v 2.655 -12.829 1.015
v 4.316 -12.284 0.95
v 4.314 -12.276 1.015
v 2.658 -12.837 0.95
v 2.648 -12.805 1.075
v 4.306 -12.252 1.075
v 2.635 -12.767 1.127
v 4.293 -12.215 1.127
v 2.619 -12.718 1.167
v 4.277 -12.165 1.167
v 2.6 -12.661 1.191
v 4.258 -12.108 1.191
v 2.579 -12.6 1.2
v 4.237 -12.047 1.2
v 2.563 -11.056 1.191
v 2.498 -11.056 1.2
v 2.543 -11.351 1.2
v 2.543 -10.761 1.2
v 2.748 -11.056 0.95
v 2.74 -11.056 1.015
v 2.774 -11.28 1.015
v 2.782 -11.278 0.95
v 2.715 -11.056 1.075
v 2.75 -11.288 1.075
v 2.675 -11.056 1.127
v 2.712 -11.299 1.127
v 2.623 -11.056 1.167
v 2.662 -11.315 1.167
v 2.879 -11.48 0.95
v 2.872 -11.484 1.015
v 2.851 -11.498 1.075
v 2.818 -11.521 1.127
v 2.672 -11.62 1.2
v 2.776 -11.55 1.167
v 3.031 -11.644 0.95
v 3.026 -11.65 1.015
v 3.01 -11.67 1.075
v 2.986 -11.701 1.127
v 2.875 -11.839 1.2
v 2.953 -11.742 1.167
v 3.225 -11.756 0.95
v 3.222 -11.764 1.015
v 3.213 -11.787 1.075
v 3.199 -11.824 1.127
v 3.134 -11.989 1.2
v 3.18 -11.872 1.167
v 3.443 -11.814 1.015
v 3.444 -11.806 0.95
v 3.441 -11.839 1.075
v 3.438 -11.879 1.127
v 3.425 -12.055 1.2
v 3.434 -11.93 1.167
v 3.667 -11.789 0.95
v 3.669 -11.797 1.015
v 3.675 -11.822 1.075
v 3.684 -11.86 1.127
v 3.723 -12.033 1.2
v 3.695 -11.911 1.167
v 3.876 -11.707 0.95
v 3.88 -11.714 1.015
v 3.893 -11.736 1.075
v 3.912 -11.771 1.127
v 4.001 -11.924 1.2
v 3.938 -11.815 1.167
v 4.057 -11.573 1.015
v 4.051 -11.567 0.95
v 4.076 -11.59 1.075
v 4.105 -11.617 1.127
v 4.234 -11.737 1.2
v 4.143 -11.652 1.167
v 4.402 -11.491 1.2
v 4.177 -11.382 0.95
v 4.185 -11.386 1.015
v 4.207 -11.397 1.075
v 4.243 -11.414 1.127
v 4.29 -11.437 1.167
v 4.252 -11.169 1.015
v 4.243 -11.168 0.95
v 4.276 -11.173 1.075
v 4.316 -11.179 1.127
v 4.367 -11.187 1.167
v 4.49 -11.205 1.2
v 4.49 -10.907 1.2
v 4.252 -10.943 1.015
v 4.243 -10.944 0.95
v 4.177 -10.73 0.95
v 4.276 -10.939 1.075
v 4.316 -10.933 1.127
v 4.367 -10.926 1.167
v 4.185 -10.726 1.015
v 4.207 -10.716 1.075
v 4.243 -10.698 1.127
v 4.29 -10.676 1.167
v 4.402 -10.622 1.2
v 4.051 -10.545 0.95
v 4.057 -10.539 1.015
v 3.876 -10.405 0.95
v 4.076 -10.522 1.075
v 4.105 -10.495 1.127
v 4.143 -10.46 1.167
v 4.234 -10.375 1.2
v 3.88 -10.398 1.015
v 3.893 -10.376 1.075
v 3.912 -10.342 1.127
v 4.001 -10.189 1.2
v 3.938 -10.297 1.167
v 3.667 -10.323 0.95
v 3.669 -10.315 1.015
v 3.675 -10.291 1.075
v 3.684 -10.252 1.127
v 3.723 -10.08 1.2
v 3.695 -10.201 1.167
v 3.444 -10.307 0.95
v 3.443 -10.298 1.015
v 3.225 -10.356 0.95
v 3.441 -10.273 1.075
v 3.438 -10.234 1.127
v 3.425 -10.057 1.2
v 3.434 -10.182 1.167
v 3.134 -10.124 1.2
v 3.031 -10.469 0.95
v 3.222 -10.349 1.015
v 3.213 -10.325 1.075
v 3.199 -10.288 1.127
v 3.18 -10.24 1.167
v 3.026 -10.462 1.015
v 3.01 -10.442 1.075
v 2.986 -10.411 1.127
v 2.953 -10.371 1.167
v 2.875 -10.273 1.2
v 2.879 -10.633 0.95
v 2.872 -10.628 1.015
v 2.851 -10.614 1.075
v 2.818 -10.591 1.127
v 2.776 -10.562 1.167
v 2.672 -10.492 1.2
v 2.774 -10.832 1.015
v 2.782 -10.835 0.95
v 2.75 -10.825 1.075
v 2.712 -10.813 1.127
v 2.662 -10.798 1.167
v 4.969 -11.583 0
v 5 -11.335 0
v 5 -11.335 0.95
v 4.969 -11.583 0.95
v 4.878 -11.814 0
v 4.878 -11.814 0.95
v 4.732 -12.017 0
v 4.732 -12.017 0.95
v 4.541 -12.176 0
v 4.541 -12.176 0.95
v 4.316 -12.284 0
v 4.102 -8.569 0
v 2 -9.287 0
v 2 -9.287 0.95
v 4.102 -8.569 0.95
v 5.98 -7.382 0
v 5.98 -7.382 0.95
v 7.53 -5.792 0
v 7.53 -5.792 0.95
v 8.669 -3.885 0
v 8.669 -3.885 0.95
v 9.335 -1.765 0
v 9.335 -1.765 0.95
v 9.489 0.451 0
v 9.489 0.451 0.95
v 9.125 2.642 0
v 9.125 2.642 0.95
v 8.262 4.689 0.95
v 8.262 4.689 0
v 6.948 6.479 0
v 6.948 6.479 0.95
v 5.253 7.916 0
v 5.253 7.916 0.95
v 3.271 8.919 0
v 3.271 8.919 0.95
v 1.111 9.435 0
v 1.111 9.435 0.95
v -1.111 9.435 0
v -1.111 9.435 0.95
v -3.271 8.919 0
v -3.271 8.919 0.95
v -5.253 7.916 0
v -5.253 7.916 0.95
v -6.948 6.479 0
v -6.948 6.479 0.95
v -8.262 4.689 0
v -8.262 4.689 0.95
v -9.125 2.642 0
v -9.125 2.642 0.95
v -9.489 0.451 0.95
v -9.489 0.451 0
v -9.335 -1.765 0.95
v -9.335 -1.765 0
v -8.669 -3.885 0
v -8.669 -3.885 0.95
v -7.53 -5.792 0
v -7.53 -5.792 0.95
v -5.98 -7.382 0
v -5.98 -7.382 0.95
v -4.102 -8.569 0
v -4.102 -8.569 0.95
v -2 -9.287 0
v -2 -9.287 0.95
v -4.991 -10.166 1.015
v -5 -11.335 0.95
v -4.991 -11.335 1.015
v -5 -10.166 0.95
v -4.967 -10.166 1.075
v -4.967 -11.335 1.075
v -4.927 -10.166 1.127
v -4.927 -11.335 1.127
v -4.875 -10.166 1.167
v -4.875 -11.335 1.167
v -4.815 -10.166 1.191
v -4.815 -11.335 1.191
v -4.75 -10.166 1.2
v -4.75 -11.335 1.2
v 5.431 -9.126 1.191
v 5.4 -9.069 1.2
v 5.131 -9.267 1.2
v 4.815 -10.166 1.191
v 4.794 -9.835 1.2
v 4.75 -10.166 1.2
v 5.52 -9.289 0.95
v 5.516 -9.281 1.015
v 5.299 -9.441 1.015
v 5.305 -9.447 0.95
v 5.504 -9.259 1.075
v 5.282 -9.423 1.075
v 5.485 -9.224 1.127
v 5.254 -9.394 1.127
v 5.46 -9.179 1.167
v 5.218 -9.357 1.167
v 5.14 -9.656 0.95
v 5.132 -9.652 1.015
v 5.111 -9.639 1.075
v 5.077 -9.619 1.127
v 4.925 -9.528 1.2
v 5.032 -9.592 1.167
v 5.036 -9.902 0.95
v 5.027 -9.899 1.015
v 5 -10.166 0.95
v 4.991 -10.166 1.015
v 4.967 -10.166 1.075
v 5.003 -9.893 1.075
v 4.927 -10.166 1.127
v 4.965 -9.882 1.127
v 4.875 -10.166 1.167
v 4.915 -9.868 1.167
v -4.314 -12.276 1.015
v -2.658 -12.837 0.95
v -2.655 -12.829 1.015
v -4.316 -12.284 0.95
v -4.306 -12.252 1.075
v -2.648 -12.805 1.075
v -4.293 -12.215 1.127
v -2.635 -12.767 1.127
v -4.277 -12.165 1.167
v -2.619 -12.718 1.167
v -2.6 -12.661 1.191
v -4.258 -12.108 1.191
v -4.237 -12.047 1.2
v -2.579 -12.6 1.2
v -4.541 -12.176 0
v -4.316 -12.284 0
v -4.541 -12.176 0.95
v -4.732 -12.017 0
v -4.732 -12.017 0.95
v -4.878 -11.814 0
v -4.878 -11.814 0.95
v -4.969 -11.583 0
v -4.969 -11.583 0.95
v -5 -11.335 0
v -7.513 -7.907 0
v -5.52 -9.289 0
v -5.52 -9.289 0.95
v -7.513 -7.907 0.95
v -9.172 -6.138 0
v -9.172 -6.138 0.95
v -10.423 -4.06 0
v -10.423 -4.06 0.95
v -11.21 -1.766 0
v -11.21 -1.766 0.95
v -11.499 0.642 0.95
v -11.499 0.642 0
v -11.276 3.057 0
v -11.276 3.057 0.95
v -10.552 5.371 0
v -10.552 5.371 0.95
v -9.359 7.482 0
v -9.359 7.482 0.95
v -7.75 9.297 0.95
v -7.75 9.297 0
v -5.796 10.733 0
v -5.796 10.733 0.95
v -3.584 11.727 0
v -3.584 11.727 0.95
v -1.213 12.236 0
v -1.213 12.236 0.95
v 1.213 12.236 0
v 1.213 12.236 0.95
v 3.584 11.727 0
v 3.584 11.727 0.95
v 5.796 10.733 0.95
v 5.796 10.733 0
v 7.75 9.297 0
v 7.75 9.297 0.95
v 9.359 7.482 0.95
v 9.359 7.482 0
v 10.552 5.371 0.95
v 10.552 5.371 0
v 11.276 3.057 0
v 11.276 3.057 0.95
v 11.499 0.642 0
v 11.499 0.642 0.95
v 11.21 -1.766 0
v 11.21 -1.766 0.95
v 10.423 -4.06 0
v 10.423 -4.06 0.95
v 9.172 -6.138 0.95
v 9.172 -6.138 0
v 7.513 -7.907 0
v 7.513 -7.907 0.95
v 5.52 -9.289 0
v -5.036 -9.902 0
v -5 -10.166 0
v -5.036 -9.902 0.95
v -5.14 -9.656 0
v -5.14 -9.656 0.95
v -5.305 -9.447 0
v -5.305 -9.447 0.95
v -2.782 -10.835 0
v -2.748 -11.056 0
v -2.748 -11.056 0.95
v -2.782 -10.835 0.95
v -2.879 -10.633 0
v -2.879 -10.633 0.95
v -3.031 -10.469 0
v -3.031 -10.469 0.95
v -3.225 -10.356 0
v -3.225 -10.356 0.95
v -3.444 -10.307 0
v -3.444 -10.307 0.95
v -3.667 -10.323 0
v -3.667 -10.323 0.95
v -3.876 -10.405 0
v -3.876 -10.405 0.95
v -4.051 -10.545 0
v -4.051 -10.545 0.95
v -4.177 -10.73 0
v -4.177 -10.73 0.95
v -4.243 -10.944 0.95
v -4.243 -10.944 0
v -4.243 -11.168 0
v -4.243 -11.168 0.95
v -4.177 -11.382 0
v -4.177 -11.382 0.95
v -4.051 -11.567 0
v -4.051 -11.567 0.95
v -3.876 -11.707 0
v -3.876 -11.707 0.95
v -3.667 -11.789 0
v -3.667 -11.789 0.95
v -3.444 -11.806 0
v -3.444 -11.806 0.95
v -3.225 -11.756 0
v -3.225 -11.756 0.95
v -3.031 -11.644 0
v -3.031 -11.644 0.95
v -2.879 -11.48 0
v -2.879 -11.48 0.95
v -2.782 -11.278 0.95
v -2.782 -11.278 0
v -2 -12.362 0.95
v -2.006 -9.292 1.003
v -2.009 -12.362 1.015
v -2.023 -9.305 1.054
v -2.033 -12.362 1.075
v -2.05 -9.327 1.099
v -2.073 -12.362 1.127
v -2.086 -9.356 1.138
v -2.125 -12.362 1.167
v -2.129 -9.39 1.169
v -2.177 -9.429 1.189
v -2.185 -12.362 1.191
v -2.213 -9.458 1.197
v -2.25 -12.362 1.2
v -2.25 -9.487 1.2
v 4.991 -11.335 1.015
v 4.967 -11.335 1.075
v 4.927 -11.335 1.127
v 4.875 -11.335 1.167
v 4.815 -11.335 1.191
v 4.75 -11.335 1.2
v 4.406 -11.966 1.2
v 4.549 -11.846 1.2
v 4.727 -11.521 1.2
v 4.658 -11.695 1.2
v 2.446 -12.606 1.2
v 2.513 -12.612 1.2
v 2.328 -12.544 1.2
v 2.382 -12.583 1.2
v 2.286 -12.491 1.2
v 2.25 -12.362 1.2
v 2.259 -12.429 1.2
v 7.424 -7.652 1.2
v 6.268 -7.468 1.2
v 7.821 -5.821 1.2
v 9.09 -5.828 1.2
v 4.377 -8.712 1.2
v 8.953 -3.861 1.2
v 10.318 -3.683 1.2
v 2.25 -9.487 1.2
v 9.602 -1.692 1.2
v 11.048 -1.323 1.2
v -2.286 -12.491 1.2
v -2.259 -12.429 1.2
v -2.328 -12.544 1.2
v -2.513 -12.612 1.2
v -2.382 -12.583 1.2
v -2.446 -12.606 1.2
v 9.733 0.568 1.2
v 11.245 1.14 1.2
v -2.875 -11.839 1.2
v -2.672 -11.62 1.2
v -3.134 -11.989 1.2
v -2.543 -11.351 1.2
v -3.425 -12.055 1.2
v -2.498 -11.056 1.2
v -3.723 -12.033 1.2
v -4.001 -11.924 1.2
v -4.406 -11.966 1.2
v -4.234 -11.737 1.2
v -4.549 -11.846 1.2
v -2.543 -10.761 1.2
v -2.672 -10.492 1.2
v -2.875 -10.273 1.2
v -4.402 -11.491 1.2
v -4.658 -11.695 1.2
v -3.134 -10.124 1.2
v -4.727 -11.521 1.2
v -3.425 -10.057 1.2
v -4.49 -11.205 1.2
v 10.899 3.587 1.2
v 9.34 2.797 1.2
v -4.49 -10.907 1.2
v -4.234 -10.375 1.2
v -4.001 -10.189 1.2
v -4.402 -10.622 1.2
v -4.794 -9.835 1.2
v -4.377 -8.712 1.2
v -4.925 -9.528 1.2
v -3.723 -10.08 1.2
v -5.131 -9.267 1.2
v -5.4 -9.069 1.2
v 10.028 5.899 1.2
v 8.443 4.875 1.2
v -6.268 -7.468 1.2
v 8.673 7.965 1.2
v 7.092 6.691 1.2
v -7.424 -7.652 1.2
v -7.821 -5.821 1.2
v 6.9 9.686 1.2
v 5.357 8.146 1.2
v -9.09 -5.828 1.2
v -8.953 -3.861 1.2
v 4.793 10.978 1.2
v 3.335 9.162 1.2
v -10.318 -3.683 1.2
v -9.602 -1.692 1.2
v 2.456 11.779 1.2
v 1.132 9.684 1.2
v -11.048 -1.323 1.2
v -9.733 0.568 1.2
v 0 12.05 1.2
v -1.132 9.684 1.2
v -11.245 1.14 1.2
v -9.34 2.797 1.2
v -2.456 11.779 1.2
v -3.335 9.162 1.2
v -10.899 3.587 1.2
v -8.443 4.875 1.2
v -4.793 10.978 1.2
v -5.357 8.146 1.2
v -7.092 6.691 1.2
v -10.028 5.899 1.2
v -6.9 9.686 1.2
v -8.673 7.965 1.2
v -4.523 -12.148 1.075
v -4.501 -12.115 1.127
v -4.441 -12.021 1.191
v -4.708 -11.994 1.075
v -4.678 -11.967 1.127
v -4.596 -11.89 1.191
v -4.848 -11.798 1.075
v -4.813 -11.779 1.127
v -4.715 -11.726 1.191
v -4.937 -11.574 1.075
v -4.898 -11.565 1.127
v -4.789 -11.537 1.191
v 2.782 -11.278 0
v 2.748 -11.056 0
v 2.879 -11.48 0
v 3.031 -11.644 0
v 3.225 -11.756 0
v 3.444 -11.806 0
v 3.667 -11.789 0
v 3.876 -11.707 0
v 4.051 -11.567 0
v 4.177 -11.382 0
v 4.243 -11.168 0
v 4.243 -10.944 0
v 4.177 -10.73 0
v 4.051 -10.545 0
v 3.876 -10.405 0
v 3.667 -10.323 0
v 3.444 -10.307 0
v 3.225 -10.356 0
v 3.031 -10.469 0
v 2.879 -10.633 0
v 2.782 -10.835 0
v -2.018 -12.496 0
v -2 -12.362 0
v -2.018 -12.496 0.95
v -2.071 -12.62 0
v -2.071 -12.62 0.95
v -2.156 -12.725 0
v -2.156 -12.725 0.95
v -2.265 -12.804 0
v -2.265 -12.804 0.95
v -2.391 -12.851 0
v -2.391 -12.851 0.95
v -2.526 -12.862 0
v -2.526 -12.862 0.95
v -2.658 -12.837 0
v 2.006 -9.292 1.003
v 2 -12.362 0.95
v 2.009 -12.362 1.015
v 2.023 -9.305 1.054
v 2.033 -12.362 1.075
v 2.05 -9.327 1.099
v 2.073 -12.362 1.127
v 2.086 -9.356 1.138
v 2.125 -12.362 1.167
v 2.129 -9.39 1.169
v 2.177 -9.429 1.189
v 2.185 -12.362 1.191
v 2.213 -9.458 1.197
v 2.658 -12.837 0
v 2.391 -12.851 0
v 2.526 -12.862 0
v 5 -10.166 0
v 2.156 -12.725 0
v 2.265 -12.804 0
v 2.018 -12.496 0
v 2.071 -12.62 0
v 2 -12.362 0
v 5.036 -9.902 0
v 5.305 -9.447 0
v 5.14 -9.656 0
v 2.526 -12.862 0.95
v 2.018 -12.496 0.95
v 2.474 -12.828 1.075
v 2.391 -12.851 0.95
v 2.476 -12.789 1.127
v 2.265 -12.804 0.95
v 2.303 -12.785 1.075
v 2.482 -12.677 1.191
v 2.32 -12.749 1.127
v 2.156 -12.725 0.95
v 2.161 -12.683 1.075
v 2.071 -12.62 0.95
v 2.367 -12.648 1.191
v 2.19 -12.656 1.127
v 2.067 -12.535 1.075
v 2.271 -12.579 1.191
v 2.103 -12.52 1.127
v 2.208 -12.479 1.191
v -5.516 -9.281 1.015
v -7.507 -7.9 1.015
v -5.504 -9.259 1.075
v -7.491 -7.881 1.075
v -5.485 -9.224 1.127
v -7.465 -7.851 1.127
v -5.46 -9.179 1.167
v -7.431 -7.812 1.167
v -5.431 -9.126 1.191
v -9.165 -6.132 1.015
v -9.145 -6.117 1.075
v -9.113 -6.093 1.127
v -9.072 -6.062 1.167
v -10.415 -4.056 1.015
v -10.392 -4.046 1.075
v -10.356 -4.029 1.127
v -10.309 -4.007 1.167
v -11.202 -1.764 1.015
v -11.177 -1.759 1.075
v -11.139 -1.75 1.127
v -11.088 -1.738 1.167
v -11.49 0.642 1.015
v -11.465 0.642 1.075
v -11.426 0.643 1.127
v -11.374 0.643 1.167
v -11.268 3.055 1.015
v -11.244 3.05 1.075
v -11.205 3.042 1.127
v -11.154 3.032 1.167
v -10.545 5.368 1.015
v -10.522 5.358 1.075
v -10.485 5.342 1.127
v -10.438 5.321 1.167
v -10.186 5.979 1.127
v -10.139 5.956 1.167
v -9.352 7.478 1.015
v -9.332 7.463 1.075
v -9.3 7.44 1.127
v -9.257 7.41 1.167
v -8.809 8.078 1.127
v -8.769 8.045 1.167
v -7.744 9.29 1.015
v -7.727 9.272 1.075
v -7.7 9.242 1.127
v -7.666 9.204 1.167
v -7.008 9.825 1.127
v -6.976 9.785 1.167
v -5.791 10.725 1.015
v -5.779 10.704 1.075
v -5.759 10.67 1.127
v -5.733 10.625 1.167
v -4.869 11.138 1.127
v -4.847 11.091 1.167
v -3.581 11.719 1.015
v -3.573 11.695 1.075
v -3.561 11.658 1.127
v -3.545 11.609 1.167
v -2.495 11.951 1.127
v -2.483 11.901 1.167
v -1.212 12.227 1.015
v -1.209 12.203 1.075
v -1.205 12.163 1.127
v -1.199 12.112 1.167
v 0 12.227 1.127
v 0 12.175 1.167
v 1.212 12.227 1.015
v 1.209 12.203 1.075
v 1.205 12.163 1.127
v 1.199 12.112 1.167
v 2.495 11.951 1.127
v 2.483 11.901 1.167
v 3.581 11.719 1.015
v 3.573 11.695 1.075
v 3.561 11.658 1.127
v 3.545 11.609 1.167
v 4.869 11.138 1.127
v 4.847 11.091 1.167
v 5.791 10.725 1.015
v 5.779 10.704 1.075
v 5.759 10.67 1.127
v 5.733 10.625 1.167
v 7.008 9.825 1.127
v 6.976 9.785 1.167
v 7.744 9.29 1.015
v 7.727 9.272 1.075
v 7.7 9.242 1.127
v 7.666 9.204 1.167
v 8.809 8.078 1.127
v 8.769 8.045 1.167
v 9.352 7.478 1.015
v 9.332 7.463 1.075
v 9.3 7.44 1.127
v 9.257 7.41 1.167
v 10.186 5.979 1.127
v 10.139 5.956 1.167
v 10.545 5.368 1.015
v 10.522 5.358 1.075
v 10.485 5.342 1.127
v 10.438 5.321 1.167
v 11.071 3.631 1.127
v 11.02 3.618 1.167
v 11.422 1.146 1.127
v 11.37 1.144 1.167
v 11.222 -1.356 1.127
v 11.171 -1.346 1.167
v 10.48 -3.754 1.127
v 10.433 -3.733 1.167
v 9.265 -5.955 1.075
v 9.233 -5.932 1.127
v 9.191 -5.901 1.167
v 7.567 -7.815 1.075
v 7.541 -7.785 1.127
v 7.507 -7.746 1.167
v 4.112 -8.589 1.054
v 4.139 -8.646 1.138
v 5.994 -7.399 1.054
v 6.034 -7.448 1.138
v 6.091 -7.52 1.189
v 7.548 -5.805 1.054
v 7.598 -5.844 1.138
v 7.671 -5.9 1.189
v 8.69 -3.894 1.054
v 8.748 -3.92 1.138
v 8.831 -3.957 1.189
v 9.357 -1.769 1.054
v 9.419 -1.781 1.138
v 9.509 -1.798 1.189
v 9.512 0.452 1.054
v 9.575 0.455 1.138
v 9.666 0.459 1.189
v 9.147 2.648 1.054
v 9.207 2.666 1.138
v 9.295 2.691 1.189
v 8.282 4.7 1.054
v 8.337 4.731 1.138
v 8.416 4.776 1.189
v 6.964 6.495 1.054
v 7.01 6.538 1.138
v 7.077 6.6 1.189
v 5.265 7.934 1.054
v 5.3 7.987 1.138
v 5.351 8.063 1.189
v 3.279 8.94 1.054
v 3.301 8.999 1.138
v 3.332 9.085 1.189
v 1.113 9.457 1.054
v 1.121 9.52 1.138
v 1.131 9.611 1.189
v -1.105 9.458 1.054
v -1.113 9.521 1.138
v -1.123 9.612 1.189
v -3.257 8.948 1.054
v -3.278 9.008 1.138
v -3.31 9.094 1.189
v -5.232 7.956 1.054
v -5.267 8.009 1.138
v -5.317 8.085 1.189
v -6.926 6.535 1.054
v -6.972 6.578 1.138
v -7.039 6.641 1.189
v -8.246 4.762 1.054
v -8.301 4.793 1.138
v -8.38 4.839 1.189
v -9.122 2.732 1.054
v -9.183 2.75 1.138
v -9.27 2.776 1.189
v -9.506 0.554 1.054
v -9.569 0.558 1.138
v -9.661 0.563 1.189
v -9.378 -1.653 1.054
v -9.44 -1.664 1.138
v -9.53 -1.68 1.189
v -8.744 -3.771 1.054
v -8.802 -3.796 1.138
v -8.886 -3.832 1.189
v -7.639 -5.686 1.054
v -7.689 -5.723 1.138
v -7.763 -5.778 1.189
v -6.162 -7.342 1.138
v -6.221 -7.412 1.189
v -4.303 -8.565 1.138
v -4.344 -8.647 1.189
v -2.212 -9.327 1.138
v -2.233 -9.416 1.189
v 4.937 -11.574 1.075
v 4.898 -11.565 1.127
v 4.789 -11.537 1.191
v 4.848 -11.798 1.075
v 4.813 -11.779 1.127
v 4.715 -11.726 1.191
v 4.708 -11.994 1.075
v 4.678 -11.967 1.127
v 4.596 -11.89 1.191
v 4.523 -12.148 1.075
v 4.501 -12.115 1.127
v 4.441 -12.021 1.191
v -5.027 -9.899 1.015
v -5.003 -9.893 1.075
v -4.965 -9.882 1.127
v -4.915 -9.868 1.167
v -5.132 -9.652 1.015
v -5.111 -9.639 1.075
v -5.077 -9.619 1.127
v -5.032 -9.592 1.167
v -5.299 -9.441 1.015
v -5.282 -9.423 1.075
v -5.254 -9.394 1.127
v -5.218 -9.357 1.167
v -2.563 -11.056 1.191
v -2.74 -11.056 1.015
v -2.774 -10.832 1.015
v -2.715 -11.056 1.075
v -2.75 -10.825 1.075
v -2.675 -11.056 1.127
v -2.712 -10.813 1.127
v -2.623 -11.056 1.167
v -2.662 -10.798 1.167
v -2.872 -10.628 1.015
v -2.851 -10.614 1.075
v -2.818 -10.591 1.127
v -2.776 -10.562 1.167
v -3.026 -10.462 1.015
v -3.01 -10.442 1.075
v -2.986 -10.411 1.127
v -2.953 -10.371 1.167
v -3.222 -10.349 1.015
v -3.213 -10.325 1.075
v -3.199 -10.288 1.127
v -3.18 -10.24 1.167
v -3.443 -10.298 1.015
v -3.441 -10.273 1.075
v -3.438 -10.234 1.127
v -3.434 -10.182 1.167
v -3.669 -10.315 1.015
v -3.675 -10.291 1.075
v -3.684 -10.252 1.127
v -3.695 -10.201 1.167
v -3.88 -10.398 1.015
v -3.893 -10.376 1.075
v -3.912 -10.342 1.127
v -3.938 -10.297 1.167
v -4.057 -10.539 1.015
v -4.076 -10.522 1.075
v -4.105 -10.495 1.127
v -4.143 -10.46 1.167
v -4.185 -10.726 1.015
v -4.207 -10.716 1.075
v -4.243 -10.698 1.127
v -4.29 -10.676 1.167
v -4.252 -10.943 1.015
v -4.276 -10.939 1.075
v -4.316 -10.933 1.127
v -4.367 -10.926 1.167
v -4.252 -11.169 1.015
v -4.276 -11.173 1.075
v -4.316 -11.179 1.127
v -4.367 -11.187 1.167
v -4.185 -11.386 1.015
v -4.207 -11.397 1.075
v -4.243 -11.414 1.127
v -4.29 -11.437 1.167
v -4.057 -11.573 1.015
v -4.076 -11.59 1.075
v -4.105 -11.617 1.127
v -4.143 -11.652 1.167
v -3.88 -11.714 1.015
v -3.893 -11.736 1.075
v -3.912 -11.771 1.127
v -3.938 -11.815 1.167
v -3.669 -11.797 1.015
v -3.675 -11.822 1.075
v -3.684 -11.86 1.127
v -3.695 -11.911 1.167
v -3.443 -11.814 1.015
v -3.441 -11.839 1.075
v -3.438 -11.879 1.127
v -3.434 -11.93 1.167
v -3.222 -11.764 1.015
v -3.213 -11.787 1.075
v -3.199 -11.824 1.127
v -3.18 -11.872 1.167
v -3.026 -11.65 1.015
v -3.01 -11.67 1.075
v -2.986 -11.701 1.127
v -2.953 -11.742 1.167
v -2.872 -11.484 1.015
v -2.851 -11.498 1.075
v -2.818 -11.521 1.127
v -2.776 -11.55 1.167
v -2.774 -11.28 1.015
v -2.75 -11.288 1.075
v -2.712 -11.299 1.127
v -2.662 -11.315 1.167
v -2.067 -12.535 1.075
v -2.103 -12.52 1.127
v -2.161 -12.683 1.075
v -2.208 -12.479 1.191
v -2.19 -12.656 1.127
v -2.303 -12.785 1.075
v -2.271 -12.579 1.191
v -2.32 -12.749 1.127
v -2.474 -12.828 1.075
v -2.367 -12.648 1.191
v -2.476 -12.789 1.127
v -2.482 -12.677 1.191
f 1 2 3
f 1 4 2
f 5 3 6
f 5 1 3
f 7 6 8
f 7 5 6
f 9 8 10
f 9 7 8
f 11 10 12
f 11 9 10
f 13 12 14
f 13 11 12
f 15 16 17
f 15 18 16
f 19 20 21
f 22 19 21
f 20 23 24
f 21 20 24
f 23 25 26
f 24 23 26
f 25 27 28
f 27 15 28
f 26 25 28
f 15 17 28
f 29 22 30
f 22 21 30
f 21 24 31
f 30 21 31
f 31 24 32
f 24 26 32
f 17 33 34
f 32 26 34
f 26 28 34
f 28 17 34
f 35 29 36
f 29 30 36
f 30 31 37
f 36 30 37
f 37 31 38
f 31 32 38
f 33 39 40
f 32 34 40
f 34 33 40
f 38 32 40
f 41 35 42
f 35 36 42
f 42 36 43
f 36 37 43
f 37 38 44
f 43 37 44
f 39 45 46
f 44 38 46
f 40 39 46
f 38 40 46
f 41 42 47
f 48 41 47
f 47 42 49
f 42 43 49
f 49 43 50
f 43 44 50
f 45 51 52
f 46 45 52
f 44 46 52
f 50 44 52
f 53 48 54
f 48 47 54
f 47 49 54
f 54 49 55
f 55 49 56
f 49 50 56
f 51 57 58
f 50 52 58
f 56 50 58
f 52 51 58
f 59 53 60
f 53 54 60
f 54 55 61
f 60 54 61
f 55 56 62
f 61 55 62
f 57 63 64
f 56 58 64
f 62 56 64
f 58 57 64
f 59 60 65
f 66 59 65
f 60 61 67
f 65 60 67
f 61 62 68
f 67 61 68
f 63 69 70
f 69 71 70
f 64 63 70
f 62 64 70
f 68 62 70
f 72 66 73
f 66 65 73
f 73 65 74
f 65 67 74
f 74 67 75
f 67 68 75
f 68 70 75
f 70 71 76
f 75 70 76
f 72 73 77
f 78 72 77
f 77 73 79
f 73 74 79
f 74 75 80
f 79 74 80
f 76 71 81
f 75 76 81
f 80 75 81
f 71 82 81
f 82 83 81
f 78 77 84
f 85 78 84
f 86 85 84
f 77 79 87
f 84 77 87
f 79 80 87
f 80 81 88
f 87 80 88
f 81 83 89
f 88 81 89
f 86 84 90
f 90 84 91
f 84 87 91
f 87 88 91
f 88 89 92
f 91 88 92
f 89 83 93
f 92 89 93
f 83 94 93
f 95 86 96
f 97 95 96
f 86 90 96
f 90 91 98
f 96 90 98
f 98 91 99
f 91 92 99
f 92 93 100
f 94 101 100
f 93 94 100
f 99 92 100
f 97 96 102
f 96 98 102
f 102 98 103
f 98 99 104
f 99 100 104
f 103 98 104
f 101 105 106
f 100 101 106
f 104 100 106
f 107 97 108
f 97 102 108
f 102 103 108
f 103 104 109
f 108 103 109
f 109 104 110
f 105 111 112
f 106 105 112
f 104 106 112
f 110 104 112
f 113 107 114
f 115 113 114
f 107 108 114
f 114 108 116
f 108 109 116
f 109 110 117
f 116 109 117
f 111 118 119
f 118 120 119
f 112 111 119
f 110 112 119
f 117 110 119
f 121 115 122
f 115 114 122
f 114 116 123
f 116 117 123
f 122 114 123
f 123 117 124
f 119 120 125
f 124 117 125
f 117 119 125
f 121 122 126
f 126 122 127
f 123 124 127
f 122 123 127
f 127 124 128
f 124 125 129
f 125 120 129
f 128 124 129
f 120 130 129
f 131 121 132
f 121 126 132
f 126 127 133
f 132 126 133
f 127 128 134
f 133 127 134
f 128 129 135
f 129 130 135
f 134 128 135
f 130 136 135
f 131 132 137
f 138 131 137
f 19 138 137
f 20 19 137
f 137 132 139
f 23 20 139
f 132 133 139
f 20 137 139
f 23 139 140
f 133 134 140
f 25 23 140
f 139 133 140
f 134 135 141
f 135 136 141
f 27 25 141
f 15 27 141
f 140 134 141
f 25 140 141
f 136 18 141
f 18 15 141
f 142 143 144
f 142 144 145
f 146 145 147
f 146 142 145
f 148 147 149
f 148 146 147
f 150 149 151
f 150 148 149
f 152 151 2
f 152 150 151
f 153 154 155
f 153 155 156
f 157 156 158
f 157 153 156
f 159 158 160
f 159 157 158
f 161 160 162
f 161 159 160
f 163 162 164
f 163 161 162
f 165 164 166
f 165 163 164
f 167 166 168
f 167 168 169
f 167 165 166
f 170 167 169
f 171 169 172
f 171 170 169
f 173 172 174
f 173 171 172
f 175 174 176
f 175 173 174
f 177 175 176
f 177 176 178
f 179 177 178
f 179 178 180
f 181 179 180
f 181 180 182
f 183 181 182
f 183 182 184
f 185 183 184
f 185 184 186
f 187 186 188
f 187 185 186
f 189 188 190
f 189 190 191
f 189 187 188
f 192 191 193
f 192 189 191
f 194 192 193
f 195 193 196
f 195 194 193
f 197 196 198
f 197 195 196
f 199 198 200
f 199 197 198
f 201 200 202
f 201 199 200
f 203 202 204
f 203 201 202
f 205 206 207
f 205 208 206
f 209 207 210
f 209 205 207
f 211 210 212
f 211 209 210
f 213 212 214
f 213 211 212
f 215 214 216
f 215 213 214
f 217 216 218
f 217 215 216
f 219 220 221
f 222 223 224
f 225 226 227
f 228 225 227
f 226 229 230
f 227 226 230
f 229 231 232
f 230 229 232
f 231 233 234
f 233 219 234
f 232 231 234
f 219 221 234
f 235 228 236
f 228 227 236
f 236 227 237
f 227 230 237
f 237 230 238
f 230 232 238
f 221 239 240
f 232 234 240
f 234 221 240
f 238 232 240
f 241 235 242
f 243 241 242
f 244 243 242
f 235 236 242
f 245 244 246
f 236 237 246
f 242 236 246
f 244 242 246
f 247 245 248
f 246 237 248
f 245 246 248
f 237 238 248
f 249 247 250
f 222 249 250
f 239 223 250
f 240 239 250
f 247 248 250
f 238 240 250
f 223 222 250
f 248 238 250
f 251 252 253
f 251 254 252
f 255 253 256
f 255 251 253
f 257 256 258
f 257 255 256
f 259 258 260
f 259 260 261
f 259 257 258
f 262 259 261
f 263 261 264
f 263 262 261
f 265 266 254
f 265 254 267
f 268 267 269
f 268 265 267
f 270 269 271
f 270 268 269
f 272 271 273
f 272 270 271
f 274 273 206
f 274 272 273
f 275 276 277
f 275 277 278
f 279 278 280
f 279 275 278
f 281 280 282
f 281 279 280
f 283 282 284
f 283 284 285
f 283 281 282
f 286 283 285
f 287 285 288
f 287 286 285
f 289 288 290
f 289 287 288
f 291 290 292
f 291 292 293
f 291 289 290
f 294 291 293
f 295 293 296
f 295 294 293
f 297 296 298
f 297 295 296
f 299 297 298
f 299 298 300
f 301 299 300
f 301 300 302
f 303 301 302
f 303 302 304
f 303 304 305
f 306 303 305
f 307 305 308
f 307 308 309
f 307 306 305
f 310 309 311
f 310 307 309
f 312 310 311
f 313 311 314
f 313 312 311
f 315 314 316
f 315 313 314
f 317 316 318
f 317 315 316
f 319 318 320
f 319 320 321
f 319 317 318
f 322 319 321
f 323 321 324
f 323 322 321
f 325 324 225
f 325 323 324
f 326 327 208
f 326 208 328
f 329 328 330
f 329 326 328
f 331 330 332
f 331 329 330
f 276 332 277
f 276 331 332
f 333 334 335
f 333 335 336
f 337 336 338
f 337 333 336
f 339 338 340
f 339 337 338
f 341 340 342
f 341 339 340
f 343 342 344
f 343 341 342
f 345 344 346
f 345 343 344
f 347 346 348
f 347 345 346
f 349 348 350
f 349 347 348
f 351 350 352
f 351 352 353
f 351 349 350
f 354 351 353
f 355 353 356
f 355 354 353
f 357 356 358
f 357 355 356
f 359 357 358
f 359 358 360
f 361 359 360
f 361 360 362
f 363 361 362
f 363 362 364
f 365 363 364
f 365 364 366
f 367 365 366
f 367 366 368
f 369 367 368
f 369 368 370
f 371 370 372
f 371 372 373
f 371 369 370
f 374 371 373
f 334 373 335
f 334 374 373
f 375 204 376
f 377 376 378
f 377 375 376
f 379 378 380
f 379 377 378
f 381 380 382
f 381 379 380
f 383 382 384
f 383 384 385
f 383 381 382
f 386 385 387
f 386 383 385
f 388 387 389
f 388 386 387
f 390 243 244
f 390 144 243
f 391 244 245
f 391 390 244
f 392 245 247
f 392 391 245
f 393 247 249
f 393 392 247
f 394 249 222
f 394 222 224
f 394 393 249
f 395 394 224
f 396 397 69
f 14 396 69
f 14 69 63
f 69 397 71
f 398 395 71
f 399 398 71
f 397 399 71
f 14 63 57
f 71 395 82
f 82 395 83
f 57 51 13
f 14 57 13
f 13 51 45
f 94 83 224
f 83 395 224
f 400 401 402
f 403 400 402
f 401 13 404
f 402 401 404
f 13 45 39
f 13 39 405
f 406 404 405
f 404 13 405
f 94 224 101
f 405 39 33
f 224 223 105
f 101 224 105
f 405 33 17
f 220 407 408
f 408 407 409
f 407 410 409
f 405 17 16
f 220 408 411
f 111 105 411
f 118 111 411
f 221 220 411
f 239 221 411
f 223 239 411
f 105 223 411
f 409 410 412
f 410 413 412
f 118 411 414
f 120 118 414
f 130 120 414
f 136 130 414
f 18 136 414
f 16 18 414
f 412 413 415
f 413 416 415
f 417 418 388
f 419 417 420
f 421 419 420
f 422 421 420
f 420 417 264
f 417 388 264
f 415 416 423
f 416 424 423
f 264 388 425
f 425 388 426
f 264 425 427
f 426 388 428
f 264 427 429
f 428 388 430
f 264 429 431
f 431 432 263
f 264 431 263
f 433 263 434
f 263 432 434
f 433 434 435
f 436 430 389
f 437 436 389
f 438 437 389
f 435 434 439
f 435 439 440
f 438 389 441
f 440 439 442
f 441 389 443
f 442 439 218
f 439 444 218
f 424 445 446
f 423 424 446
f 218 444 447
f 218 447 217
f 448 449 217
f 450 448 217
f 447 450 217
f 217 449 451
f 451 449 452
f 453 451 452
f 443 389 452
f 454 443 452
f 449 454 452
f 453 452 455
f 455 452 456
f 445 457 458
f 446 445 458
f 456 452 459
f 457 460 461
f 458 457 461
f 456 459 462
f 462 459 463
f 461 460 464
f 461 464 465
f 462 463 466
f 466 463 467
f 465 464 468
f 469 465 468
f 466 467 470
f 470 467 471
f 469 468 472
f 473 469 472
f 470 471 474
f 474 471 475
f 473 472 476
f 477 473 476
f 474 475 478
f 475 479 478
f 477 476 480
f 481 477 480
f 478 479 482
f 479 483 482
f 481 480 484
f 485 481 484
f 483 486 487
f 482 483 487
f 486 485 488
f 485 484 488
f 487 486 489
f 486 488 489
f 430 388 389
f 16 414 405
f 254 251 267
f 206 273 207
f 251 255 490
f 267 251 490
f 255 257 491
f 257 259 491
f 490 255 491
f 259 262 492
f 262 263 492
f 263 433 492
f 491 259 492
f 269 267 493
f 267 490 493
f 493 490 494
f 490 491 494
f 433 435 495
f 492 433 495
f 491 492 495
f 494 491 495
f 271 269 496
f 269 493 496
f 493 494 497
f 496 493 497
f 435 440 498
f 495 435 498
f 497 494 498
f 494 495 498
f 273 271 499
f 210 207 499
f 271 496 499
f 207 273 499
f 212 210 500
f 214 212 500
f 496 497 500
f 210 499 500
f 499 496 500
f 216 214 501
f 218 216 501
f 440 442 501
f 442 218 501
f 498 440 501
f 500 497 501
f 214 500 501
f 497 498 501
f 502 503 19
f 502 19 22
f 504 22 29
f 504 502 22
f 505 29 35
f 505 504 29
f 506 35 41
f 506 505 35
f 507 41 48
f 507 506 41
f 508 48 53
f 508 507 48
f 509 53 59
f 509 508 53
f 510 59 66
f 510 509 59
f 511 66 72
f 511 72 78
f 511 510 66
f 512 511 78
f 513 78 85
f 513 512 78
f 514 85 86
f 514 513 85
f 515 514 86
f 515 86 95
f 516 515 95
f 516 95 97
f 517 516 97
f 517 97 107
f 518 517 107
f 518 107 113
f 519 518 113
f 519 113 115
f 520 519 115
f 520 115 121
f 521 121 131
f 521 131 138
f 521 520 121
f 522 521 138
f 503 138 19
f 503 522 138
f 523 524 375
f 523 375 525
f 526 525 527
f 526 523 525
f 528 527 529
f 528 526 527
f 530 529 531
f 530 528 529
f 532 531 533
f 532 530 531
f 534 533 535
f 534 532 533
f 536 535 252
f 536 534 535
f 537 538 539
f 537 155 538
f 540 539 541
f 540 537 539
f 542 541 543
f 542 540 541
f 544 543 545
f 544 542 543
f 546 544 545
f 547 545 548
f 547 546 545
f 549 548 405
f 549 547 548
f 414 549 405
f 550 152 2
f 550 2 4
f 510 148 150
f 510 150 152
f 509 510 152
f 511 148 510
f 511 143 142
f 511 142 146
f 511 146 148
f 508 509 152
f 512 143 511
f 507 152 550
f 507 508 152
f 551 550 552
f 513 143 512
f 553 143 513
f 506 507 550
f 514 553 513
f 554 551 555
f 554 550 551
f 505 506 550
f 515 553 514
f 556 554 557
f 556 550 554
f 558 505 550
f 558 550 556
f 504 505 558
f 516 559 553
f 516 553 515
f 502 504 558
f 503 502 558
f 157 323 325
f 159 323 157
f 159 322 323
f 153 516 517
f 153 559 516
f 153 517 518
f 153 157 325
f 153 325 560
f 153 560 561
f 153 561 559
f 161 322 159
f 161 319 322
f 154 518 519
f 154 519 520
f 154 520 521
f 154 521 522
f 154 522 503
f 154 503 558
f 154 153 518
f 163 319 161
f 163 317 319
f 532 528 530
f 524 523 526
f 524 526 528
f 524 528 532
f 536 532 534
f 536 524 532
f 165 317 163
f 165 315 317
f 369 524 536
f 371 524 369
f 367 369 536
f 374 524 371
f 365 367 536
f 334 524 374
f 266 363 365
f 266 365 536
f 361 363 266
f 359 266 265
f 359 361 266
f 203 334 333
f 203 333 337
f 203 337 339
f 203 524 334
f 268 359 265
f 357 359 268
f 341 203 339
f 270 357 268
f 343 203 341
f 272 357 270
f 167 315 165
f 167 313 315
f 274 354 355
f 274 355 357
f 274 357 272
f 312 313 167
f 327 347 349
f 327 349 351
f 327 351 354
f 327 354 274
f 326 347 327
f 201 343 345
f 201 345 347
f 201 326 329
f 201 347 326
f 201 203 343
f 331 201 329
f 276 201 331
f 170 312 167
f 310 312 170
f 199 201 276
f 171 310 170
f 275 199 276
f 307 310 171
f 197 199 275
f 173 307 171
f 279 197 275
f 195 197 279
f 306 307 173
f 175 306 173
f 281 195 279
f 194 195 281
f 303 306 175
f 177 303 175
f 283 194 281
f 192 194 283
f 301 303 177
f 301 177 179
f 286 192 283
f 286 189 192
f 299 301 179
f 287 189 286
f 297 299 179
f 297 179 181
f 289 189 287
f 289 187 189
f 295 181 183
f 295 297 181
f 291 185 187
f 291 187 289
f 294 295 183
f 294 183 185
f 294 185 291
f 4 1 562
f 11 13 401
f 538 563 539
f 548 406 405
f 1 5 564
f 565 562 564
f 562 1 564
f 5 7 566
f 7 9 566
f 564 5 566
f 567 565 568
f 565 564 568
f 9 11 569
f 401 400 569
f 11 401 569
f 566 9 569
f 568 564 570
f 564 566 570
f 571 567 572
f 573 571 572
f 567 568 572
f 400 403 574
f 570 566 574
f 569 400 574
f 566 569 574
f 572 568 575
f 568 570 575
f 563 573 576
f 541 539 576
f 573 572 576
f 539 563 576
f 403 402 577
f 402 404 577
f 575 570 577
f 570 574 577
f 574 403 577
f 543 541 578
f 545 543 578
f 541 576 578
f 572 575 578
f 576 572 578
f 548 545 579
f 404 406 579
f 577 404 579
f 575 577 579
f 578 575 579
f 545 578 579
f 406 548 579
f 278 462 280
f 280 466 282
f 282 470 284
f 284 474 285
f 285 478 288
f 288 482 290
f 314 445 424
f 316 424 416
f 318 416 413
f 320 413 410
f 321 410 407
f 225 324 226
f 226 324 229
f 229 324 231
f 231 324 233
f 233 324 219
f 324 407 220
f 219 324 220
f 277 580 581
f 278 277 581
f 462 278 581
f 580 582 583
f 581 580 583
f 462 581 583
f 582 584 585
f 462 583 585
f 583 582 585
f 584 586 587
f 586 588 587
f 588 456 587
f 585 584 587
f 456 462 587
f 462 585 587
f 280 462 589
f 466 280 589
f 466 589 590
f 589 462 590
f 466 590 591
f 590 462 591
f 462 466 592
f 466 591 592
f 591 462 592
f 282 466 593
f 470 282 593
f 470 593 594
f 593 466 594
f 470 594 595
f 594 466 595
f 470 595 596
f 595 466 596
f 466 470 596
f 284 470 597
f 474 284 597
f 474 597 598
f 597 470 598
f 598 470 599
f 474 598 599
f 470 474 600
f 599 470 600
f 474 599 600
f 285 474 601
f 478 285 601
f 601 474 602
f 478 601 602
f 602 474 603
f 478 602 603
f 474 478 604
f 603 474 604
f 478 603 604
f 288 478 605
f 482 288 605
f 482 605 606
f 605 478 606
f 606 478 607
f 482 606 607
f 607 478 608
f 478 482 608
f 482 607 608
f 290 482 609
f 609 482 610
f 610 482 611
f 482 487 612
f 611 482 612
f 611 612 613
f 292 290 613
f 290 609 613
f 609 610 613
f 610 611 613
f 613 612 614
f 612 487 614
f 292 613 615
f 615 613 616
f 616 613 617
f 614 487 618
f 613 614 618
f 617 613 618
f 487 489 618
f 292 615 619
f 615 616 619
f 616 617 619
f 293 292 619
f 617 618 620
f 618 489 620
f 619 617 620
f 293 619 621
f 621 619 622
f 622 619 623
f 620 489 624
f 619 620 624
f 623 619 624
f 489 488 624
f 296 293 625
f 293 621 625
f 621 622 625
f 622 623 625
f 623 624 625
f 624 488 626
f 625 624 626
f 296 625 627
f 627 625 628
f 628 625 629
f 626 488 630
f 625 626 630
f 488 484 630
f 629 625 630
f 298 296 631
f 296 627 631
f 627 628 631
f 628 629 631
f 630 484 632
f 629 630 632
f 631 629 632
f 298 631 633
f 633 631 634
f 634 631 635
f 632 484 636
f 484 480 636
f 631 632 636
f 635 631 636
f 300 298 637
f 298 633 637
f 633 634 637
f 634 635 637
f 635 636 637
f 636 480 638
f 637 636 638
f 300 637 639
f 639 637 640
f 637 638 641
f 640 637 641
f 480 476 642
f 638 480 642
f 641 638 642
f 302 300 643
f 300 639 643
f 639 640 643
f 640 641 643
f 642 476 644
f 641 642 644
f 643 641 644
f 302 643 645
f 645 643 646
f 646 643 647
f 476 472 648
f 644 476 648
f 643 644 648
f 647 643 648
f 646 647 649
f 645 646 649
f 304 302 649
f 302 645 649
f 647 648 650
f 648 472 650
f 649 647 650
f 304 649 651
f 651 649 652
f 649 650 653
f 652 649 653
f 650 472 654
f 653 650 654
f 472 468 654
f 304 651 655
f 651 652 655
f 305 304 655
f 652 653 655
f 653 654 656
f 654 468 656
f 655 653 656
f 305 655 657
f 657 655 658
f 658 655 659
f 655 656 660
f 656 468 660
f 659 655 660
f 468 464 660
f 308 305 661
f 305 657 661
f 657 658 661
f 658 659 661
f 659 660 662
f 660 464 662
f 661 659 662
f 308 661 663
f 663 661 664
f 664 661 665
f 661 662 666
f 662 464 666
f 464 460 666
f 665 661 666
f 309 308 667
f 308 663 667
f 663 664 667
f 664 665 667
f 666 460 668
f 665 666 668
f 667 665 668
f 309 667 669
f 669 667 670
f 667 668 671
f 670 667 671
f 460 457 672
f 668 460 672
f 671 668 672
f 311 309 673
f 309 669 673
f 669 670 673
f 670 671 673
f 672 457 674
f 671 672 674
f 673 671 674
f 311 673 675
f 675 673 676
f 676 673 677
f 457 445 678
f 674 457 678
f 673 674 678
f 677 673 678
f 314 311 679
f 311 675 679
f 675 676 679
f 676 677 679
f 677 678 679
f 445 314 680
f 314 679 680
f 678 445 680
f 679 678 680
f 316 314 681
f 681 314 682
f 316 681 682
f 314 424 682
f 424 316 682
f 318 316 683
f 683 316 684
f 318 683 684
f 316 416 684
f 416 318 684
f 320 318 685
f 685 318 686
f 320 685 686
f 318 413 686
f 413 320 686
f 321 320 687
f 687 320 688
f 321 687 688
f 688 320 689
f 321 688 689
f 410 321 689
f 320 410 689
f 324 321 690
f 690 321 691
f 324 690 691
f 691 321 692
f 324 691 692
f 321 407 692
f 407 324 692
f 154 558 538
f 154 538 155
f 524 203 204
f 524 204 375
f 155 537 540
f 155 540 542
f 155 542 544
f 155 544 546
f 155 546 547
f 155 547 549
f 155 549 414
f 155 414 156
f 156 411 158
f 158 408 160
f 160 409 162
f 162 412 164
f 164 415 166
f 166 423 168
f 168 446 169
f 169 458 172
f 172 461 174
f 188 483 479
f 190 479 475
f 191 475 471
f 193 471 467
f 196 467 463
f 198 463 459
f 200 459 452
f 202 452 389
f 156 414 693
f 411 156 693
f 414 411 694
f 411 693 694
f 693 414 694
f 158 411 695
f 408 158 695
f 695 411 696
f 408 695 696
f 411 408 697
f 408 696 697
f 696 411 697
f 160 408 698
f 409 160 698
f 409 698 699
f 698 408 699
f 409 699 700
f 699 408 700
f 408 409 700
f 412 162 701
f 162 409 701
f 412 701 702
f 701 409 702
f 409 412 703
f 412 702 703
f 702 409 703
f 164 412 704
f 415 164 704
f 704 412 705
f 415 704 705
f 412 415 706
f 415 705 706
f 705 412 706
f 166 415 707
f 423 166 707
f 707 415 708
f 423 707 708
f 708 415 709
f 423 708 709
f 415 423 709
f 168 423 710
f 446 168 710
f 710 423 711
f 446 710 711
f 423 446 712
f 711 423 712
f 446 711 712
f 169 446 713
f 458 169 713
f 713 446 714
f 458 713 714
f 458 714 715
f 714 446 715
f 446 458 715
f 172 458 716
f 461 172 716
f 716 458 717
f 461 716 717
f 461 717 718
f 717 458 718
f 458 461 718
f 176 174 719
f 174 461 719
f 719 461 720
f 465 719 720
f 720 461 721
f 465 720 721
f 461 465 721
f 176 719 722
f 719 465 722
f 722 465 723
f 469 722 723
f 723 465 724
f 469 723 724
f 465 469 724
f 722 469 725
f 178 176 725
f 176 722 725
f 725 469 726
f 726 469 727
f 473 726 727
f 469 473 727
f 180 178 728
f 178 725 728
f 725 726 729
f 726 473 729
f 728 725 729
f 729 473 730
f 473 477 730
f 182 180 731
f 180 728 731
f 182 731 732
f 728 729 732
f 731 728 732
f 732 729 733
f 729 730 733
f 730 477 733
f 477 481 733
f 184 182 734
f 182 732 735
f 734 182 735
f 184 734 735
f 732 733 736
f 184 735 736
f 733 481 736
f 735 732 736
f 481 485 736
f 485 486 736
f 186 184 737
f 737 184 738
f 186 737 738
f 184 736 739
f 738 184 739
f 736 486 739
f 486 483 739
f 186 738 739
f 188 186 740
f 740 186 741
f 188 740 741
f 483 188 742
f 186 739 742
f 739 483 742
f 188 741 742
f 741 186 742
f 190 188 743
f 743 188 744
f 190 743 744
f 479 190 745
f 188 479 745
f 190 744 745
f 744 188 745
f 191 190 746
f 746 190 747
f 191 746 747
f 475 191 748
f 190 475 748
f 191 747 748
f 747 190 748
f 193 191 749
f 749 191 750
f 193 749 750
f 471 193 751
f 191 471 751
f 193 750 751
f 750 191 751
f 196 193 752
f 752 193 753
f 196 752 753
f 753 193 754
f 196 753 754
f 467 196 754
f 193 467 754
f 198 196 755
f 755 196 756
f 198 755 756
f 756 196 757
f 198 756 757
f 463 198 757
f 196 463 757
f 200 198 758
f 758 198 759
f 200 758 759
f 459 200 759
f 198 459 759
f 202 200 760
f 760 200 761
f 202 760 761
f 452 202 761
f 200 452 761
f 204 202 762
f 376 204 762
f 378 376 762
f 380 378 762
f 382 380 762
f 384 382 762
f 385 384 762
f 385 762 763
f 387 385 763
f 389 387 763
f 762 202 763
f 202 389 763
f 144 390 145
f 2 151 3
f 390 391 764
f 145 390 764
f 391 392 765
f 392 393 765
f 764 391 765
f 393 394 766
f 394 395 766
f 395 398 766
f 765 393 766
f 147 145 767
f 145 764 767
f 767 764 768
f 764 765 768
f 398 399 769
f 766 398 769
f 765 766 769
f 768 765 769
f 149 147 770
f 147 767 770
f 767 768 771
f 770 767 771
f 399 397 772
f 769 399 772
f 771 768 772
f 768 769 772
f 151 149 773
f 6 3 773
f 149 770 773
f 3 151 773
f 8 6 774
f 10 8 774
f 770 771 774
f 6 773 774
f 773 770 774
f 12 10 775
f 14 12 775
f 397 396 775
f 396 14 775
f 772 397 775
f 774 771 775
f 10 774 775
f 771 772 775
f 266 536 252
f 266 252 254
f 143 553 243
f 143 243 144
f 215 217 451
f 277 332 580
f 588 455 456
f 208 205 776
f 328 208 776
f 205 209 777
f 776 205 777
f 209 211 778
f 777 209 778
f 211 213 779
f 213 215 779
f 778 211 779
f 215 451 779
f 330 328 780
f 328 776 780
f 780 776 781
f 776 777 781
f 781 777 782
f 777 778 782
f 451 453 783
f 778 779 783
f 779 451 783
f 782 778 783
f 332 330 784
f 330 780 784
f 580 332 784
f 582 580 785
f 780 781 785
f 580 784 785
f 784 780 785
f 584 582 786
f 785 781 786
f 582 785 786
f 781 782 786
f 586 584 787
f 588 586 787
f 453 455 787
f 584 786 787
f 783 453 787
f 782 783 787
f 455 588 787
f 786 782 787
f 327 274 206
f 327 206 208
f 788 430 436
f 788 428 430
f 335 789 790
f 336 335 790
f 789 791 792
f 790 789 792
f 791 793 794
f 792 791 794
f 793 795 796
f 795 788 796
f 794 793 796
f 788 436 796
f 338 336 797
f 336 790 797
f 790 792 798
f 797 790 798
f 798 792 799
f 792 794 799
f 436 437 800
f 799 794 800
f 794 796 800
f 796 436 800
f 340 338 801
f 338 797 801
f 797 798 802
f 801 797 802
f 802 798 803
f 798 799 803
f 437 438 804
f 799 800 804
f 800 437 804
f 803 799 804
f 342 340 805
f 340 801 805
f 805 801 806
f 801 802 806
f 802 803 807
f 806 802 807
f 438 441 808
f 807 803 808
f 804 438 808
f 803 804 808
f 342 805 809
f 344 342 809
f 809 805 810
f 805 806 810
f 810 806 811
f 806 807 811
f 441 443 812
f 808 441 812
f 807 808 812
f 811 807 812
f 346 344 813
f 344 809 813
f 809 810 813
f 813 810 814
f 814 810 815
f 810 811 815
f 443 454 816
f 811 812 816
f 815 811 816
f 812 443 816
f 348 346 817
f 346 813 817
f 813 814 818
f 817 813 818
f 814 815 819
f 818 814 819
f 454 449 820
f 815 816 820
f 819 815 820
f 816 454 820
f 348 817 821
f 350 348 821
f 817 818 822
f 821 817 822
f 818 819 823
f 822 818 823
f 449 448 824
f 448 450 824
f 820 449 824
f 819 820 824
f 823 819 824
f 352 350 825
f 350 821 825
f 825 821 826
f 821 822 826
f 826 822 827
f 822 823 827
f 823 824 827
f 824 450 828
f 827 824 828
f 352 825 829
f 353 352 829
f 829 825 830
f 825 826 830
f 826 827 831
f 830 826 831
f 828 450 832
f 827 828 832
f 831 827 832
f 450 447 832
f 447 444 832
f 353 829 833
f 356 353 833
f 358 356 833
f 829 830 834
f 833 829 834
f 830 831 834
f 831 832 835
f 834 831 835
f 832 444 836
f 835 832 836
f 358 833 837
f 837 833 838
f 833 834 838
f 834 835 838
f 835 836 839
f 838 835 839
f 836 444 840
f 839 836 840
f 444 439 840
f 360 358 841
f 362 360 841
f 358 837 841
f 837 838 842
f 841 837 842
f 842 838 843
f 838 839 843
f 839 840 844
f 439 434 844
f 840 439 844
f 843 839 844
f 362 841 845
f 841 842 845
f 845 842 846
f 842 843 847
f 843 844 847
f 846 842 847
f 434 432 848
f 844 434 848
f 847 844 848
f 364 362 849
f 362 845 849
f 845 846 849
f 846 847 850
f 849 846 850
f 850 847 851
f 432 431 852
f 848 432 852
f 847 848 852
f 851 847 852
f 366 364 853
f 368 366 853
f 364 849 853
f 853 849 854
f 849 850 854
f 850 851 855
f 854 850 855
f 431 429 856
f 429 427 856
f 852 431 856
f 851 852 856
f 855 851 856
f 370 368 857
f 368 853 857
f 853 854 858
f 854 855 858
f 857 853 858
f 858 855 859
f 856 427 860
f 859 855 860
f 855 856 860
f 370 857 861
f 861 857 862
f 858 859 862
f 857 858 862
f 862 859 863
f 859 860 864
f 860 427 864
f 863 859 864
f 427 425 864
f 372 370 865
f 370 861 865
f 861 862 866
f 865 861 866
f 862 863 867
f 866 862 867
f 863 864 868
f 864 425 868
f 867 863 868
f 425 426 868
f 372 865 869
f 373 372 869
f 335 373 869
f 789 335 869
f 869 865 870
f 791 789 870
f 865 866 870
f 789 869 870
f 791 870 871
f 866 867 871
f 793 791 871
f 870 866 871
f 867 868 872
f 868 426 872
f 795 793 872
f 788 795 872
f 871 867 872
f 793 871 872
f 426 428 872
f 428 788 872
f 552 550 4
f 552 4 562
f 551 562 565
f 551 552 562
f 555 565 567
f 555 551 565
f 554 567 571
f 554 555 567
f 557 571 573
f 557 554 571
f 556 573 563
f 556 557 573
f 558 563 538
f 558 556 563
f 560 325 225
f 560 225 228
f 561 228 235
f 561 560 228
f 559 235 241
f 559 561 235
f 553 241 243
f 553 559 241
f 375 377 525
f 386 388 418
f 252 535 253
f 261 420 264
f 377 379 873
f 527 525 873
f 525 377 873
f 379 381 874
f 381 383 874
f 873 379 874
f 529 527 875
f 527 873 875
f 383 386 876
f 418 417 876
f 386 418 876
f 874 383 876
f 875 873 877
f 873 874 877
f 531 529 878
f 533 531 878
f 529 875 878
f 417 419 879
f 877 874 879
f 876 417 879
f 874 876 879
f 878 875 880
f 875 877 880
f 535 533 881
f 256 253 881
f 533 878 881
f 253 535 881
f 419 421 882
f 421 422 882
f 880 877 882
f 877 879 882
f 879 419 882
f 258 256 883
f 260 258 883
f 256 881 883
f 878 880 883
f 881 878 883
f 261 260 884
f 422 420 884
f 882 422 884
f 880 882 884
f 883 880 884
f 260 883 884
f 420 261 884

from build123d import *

# Parameters (mm, degrees)
SKETCH1_R           = 0.751639909
BOSS_EXTRUDE1_DEPTH = 1.2
FILLET1_R           = 0.25


with BuildPart() as part:
    # Sketch1 → Boss-Extrude1 (new body)
    with BuildSketch(Plane.XY):
        with BuildLine():
            Line((-2, -9.287087811), (-2, -10.524751653))
            Line((-2, -10.524751653), (-2, -12.362444645))
            ThreePointArc((-2, -12.362444645), (-2.207644858, -12.768065738), (-2.658113883, -12.836786294))
            Line((-2.658113883, -12.836786294), (-4.316227766, -12.284081667))
            ThreePointArc((-4.316227766, -12.284081667), (-4.811242185, -11.920108653), (-5, -11.335398369))
            Line((-5, -11.335398369), (-5, -10.1658561))
            ThreePointArc((-5, -10.1658561), (-5.139767473, -9.655954148), (-5.52, -9.288587612))
            ThreePointArc((-5.52, -9.288587612), (0, 12.3), (5.52, -9.288587612))
            ThreePointArc((5.52, -9.288587612), (5.139767473, -9.655954148), (5, -10.1658561))
            Line((5, -10.1658561), (5, -11.335398369))
            ThreePointArc((5, -11.335398369), (4.811242185, -11.920108653), (4.316227766, -12.284081667))
            Line((4.316227766, -12.284081667), (2.658113883, -12.836786294))
            ThreePointArc((2.658113883, -12.836786294), (2.207644858, -12.768065738), (2, -12.362444645))
            Line((2, -12.362444645), (2, -10.524751653))
            Line((2, -10.524751653), (2, -9.287087811))
            ThreePointArc((2, -9.287087811), (0, 9.5), (-2, -9.287087811))
        make_face()
        with Locations((-3.5, -11.056157589)):
            Circle(SKETCH1_R, mode=Mode.SUBTRACT)
        with Locations(Location((3.5, -11.056157589, 0), (0, 0, 180))):
            Circle(SKETCH1_R, mode=Mode.SUBTRACT)
    extrude(amount=BOSS_EXTRUDE1_DEPTH)

    # Fillet1
    fillet1_edges = [part.edges().sort_by_distance(p)[0] for p in [
        (-4.811242185, -11.920108653, 1.2),
        (-3.487170825, -12.56043398, 1.2),
        (-2.207644858, -12.768065738, 1.2),
        (-2, -10.824766228, 1.2),
        (0, 9.5, 1.2),
        (2, -10.824766228, 1.2),
        (2.207644858, -12.768065738, 1.2),
        (3.487170825, -12.56043398, 1.2),
        (-4.251639909, -11.056157589, 1.2),
        (-5.139767473, -9.655954148, 1.2),
        (4.811242185, -11.920108653, 1.2),
        (5, -10.750627234, 1.2),
        (4.251639909, -11.056157589, 1.2),
        (5.139767473, -9.655954148, 1.2),
        (0, 12.3, 1.2),
        (-5, -10.750627234, 1.2),
    ]]
    fillet(fillet1_edges, radius=FILLET1_R)


solid = part.part
